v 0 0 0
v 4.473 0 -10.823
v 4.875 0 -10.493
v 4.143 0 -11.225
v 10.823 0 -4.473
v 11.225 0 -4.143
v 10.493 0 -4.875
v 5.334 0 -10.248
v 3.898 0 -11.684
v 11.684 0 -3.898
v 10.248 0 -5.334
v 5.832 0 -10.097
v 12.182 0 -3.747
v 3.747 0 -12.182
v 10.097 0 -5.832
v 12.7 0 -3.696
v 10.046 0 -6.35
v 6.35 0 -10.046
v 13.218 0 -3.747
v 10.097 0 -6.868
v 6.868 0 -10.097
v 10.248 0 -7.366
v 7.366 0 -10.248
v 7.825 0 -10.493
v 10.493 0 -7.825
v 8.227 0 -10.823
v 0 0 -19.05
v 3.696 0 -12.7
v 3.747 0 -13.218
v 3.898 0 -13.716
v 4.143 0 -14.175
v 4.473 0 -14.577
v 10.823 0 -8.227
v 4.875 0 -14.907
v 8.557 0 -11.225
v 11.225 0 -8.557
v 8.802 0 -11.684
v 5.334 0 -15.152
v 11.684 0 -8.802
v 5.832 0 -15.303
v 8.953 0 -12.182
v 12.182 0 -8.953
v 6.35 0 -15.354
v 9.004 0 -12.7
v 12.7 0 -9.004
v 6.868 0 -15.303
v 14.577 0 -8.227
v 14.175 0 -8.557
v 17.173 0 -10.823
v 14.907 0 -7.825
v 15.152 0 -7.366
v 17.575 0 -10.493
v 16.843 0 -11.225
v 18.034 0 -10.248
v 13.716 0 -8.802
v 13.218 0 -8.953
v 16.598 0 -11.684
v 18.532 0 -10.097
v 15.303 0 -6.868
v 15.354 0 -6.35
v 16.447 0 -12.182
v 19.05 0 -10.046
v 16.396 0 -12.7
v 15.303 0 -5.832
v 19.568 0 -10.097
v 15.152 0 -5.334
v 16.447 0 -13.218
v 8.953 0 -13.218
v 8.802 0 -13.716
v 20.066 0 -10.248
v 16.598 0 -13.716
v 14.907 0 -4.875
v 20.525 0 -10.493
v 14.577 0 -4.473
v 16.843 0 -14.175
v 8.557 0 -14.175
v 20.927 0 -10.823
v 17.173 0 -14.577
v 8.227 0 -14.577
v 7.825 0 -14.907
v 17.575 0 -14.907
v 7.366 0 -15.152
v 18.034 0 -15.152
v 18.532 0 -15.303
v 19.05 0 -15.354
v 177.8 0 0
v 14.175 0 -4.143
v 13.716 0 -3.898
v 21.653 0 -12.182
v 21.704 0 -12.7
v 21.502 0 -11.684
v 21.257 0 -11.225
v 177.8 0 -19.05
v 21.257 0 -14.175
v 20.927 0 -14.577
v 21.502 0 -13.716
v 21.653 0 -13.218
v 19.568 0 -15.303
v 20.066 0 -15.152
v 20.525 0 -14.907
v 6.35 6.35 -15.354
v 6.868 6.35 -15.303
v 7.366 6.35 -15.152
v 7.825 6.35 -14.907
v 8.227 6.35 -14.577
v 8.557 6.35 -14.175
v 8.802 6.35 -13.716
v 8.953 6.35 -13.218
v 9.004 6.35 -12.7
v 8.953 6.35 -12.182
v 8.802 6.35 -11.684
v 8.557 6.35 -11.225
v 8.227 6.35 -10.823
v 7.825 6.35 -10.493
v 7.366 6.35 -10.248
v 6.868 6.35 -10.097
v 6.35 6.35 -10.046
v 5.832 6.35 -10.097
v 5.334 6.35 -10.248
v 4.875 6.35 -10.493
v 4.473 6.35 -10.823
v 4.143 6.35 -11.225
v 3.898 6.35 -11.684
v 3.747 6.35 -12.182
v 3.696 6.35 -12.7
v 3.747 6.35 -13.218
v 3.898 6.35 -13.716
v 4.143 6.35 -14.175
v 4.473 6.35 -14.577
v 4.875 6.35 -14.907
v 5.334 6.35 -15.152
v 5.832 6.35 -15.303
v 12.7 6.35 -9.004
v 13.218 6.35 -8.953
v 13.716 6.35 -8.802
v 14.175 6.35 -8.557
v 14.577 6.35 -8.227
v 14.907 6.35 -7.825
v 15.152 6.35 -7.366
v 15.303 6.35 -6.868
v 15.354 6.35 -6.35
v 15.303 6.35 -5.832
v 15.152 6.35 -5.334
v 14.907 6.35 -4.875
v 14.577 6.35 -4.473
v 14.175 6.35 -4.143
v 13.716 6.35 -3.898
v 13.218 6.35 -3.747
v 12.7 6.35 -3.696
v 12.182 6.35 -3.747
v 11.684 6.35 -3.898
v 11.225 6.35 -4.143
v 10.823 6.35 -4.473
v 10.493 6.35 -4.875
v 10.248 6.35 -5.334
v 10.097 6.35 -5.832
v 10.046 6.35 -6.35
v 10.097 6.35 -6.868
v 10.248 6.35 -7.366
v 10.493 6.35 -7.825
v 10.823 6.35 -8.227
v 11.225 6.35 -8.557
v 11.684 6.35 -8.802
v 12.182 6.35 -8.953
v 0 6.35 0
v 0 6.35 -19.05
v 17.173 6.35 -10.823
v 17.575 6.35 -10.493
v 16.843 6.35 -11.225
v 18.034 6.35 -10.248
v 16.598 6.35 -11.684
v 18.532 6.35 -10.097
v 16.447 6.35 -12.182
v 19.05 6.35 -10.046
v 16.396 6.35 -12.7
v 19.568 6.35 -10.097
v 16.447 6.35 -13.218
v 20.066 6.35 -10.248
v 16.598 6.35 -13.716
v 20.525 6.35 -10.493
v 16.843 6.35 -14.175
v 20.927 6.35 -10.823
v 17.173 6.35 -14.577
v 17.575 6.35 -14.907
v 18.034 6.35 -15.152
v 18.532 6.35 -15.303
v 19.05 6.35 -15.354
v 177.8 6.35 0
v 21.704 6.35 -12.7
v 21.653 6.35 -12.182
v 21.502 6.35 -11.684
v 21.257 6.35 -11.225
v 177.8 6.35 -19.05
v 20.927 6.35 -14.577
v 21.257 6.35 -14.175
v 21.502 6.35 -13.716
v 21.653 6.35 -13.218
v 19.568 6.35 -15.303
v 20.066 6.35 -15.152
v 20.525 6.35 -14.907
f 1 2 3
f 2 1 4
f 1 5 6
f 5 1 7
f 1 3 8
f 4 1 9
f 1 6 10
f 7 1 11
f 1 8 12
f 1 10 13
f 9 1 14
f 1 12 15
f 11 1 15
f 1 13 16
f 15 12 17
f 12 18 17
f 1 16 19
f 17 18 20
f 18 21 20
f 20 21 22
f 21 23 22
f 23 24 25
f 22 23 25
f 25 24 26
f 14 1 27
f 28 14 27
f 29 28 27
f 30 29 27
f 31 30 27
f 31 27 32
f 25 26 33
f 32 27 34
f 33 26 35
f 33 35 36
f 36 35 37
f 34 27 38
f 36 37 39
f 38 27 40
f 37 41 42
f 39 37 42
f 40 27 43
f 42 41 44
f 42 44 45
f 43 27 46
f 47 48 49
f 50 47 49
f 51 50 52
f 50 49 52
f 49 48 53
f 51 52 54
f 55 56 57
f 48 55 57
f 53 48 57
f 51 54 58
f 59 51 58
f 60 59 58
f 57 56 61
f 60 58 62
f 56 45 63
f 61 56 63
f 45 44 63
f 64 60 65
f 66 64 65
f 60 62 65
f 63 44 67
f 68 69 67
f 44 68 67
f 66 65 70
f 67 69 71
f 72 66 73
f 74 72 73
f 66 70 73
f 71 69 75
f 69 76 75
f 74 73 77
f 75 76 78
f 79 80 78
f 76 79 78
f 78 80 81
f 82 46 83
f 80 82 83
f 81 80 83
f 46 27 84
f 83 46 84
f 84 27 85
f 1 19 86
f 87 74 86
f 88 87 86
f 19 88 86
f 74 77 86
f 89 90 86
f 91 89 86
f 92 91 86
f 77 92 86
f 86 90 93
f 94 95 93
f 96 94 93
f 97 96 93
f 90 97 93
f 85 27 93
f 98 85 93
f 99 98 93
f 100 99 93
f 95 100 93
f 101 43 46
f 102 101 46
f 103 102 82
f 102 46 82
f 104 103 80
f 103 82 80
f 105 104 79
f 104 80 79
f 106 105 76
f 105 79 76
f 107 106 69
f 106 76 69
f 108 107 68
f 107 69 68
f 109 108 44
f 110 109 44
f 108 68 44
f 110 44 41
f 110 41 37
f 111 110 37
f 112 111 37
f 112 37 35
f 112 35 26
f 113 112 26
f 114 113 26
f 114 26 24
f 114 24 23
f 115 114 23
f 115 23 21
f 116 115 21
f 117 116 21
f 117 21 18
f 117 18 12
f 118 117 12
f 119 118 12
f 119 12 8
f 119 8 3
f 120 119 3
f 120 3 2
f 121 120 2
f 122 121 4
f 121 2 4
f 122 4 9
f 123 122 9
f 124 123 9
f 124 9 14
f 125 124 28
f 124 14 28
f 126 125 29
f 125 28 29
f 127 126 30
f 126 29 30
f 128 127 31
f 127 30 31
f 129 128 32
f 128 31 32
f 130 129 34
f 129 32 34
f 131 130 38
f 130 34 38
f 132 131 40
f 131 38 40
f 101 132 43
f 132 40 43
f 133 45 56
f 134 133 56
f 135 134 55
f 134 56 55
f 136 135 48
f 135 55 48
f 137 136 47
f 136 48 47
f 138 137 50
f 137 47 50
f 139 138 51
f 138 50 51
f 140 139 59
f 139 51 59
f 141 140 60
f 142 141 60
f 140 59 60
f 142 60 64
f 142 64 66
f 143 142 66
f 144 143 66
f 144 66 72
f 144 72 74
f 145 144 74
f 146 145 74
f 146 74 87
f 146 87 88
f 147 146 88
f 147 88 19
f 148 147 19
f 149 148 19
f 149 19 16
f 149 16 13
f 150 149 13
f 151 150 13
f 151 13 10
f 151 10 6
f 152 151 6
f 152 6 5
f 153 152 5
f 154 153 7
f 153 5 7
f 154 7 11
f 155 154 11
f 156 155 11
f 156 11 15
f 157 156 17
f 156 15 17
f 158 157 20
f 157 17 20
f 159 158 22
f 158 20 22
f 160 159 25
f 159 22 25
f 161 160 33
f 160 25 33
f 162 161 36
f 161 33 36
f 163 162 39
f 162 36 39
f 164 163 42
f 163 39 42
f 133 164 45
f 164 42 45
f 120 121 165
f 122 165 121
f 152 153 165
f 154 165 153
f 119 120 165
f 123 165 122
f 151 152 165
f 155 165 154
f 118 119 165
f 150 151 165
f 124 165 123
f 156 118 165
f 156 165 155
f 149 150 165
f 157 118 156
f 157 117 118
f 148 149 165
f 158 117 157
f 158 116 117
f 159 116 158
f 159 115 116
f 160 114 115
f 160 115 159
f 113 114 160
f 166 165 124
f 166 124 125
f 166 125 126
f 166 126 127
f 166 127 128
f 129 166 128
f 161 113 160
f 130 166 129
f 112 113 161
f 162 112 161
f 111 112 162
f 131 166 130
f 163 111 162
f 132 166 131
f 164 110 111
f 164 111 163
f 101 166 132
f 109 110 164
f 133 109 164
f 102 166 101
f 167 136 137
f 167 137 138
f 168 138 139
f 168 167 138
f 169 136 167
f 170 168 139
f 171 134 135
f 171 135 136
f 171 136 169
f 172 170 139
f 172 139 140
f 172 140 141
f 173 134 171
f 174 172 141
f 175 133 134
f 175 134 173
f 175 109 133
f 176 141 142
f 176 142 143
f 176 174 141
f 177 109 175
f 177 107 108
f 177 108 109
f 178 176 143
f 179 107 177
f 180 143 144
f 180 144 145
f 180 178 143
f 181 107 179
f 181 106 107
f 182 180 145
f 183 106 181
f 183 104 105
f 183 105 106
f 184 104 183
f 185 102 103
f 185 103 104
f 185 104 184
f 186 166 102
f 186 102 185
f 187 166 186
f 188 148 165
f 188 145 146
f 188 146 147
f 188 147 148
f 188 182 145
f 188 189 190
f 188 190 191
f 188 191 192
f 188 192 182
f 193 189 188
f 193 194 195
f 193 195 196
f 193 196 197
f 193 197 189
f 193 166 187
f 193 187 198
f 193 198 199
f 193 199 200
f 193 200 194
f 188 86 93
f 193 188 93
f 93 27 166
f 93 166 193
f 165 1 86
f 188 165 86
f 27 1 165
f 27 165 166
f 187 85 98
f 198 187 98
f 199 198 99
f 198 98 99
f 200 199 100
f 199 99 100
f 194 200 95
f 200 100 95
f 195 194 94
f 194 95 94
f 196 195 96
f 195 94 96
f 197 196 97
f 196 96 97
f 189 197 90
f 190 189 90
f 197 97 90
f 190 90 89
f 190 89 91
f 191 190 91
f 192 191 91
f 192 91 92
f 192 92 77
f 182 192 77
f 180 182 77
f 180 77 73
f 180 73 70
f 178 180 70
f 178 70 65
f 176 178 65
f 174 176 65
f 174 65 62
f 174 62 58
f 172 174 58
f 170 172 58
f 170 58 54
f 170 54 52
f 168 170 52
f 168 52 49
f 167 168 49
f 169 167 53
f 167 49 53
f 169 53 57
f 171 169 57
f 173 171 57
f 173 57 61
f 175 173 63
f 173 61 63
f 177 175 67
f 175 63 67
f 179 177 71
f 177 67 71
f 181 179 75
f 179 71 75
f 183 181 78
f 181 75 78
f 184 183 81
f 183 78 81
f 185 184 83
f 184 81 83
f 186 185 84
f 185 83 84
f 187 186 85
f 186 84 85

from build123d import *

# Parameters (mm, degrees)
SKETCH1_W                      = 177.8
SKETCH1_H                      = 19.05
BOSS_EXTRUDE1_DEPTH            = 6.35
F_4_0_209_DIAMETER_HOLE1_D     = 5.3086
F_4_0_209_DIAMETER_HOLE1_DEPTH = 10.668
F_4_0_209_DIAMETER_HOLE1_TIP   = 1.594864341


with BuildPart() as part:
    # Sketch1 → Boss-Extrude1 (new body)
    with BuildSketch(Plane(origin=(0, 0, 0), x_dir=(1, 0, 0), z_dir=(0, 1, 0))):
        with Locations((88.9, 9.525)):
            Rectangle(SKETCH1_W, SKETCH1_H)
    extrude(amount=BOSS_EXTRUDE1_DEPTH)

    # #4 (0.209) Diameter Hole1
    with Locations(Plane(origin=(6.35, 6.35, -12.7), x_dir=(0, 0, 1), z_dir=(0, 1, 0))):
        with Locations((0, 0), (0, 12.7), (6.35, 6.35)):
            Hole(F_4_0_209_DIAMETER_HOLE1_D / 2, depth=F_4_0_209_DIAMETER_HOLE1_DEPTH)
            with Locations((0, 0, -(F_4_0_209_DIAMETER_HOLE1_DEPTH + F_4_0_209_DIAMETER_HOLE1_TIP / 2))):  # 118° drill point
                Cone(0, F_4_0_209_DIAMETER_HOLE1_D / 2, F_4_0_209_DIAMETER_HOLE1_TIP, mode=Mode.SUBTRACT)


solid = part.part
